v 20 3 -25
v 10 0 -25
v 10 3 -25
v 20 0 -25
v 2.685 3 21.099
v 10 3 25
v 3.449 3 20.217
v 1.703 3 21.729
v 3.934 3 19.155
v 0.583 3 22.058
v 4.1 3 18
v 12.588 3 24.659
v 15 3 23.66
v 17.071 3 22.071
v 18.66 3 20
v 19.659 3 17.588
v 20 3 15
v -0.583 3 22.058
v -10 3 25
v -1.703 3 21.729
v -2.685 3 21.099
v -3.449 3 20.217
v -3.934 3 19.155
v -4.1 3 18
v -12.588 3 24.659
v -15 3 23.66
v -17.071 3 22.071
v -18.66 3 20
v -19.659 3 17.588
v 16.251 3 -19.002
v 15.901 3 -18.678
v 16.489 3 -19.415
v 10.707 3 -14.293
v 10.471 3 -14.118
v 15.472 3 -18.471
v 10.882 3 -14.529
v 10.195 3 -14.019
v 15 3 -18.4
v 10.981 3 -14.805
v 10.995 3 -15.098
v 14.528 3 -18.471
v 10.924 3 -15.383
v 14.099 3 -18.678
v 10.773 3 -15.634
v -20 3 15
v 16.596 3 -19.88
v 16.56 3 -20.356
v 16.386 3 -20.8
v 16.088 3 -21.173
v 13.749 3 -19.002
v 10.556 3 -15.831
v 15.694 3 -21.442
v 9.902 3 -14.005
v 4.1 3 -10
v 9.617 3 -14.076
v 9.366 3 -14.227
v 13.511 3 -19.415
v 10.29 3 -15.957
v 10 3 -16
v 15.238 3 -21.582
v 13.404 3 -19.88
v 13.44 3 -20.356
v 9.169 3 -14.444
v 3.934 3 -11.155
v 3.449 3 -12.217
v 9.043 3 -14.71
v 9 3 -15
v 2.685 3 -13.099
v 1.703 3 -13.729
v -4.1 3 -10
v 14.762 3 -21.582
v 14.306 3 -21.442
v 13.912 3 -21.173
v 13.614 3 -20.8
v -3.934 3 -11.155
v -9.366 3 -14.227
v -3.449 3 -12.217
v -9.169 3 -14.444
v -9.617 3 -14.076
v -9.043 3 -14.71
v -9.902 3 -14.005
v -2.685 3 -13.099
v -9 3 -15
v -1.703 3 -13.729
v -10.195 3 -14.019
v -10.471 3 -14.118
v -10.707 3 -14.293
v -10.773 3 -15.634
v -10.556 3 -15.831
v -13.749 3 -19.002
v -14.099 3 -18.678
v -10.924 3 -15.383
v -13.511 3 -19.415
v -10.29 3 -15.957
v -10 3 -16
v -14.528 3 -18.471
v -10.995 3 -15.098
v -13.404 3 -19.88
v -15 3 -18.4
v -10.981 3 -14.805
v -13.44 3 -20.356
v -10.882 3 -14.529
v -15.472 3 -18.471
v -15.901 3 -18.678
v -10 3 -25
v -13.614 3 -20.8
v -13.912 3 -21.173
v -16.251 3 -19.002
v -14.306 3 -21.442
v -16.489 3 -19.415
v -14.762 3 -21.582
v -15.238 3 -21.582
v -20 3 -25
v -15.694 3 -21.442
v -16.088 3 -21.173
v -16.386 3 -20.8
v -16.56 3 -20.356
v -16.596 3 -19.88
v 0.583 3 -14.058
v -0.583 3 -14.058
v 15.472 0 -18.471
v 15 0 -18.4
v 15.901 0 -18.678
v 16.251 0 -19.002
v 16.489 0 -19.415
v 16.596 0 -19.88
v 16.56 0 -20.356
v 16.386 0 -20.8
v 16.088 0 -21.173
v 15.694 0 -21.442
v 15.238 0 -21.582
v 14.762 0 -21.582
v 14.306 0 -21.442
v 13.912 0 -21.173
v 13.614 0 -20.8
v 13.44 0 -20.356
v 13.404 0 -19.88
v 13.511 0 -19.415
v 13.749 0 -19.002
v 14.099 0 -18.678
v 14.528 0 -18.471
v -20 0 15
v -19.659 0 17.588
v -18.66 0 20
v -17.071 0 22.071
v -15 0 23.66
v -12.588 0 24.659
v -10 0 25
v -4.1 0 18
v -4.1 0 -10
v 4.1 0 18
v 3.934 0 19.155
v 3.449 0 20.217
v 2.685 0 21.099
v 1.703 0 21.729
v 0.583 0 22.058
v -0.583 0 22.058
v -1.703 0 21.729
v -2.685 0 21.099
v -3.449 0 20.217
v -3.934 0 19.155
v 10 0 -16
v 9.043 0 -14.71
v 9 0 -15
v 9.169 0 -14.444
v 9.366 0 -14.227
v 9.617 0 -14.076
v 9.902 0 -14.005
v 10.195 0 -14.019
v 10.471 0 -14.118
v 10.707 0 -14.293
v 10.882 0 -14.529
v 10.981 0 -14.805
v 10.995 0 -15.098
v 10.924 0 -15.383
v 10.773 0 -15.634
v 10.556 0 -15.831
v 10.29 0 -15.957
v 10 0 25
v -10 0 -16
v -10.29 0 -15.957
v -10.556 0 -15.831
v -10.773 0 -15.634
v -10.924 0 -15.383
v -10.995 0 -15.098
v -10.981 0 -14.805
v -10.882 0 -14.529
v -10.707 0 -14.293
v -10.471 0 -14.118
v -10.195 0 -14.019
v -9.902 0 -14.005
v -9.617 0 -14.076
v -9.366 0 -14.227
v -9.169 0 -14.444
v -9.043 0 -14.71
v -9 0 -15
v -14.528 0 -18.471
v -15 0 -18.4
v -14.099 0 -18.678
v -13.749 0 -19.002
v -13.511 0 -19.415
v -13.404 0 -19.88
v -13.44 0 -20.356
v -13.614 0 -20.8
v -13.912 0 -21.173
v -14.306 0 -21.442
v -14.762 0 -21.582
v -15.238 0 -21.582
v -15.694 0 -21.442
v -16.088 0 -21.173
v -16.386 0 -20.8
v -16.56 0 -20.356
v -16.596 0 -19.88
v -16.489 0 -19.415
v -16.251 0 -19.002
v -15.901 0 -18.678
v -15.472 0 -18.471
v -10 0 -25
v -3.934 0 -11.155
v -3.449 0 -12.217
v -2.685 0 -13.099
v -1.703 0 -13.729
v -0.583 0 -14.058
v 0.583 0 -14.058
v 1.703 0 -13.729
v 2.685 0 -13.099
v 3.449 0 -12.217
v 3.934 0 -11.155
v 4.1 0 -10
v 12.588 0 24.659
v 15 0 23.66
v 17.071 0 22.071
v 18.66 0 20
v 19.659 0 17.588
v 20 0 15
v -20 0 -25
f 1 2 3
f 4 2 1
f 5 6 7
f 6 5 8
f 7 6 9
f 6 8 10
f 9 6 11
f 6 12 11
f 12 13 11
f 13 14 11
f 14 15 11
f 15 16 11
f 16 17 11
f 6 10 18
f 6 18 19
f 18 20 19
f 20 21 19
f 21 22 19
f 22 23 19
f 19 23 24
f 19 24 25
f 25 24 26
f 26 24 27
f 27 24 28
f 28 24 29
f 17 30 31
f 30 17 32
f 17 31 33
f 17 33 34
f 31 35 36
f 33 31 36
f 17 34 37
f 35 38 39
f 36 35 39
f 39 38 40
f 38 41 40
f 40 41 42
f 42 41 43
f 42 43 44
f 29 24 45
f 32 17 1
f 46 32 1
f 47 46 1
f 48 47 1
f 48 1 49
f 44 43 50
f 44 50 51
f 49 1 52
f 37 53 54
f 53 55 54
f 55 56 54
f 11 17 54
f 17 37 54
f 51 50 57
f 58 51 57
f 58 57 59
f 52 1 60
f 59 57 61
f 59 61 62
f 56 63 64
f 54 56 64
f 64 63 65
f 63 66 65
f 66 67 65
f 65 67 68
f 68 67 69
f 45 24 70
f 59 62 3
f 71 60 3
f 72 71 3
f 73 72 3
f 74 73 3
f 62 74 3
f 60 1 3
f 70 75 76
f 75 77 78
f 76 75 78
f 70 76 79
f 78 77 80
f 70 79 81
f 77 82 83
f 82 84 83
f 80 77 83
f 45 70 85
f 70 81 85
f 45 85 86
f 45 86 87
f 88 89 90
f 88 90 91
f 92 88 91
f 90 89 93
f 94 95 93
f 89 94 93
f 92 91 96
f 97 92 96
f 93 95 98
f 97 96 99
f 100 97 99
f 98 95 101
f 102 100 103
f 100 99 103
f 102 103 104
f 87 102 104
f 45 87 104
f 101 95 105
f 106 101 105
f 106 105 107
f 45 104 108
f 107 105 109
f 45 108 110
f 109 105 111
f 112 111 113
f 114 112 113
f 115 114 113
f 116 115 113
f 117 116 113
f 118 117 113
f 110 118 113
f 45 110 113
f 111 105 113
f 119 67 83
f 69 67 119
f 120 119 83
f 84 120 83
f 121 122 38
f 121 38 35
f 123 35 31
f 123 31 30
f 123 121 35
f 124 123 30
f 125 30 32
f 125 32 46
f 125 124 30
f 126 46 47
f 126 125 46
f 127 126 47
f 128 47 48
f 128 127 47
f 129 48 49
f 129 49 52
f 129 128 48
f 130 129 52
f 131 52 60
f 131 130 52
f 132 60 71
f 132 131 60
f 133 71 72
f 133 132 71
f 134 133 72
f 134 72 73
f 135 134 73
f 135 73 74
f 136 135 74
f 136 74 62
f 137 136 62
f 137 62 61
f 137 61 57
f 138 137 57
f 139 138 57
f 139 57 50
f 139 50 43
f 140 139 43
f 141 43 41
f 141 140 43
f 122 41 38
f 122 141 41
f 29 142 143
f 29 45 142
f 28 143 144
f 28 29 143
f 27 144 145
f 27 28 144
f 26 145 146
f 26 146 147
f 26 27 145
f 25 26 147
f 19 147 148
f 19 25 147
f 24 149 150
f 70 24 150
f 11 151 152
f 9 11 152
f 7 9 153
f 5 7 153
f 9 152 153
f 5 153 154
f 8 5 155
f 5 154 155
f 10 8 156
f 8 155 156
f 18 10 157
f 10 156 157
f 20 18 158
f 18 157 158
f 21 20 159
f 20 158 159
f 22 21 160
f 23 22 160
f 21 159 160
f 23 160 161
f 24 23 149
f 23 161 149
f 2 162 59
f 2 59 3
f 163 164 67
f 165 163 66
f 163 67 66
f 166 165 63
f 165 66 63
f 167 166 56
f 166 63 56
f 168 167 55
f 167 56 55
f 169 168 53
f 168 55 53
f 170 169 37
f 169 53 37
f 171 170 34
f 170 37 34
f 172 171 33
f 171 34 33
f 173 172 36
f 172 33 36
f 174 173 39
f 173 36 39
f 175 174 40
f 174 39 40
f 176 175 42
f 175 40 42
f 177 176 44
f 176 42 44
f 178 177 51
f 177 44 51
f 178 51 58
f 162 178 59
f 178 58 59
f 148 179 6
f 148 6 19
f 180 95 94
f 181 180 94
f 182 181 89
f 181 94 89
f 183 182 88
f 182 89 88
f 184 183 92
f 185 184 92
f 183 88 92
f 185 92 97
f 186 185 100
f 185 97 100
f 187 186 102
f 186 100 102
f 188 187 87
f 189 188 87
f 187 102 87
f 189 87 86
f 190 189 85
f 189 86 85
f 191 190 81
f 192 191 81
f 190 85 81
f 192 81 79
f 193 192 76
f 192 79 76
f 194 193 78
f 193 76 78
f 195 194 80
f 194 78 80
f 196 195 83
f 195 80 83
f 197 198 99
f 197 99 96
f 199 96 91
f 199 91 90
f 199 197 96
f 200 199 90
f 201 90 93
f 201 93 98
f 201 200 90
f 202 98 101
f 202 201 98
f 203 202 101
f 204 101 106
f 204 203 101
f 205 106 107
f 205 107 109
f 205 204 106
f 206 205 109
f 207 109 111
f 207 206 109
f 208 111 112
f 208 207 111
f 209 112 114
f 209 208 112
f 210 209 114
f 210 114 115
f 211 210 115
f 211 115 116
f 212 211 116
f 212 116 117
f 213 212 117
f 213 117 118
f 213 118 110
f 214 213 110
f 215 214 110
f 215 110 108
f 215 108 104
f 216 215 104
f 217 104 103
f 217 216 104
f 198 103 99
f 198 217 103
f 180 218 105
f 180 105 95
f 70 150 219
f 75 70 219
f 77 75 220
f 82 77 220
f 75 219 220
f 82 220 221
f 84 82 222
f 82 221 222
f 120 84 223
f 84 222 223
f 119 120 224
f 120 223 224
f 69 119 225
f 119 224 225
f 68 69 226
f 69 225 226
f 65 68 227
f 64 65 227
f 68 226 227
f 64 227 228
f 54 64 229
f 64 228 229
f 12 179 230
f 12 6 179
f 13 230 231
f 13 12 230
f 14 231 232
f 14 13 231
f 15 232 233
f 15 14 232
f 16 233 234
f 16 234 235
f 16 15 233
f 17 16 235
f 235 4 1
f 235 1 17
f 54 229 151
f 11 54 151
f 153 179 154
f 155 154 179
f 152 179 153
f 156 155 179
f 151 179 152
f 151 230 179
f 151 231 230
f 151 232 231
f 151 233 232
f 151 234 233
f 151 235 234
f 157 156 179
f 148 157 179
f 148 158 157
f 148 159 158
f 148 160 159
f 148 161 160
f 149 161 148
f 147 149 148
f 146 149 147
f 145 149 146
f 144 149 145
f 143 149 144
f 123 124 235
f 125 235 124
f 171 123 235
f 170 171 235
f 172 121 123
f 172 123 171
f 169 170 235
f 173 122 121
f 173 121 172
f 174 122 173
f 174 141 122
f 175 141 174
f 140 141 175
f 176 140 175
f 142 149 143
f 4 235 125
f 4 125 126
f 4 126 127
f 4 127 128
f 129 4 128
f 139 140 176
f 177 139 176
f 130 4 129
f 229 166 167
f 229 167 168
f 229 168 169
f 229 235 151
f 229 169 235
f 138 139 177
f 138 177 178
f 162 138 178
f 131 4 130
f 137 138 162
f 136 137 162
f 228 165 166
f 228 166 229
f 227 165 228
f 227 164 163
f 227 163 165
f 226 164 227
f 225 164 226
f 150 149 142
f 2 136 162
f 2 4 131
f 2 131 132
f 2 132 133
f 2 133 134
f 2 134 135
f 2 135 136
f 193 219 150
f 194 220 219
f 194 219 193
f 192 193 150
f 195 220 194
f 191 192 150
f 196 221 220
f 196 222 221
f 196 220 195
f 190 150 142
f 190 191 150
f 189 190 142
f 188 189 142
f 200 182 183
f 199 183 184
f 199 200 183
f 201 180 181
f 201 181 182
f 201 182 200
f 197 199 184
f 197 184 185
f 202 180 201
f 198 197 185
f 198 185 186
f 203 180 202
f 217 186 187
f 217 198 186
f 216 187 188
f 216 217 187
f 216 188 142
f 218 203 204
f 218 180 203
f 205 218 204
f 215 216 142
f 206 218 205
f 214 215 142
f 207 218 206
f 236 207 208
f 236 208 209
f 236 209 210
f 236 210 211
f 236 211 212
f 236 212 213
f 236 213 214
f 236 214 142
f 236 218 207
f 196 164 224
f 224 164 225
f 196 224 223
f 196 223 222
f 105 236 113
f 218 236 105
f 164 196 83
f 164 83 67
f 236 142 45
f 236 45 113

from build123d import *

# Parameters (mm, degrees)
SKETCH_1_R          = 1.6
EXTRUDE_1_DEPTH     = 3
FILLET_1_R          = 10
SKETCH_2_R          = 1
CUT_EXTRUDE_1_DEPTH = 3


with BuildPart() as part:
    # 草图1 → 凸台-拉伸1 (new body)
    with BuildSketch(Plane(origin=(0, 0, 0), x_dir=(1, 0, 0), z_dir=(0, 1, 0))):
        Polygon((-10, 25), (-10, 15), (10, 15), (10, 25), (20, 25), (20, -25), (-20, -25), (-20, 25), align=None)
        with Locations(Location((-15, 20, 0), (0, 0, 270))):
            Circle(SKETCH_1_R, mode=Mode.SUBTRACT)
        with Locations(Location((15, 20, 0), (0, 0, 270))):
            Circle(SKETCH_1_R, mode=Mode.SUBTRACT)
        with BuildLine():
            Line((4.1, 10), (4.1, -18))
            ThreePointArc((4.1, -18), (0, -22.1), (-4.1, -18))
            Line((-4.1, -18), (-4.1, 10))
            ThreePointArc((-4.1, 10), (0, 14.1), (4.1, 10))
        make_face(mode=Mode.SUBTRACT)
    extrude(amount=EXTRUDE_1_DEPTH)

    # 圆角1
    fillet_1_edges = [part.edges().sort_by_distance(p)[0] for p in [
        (20, 1.5, 25),
        (-20, 1.5, 25),
    ]]
    fillet(fillet_1_edges, radius=FILLET_1_R)

    # 草图2 → 切除-拉伸1 (cut)
    with BuildSketch(Plane(origin=(0, 3, 0), x_dir=(1, 0, 0), z_dir=(0, 1, 0))):
        with Locations((-10, 15)):
            Circle(SKETCH_2_R)
        with Locations((10, 15)):
            Circle(SKETCH_2_R)
    extrude(amount=-CUT_EXTRUDE_1_DEPTH, mode=Mode.SUBTRACT)


solid = part.part
